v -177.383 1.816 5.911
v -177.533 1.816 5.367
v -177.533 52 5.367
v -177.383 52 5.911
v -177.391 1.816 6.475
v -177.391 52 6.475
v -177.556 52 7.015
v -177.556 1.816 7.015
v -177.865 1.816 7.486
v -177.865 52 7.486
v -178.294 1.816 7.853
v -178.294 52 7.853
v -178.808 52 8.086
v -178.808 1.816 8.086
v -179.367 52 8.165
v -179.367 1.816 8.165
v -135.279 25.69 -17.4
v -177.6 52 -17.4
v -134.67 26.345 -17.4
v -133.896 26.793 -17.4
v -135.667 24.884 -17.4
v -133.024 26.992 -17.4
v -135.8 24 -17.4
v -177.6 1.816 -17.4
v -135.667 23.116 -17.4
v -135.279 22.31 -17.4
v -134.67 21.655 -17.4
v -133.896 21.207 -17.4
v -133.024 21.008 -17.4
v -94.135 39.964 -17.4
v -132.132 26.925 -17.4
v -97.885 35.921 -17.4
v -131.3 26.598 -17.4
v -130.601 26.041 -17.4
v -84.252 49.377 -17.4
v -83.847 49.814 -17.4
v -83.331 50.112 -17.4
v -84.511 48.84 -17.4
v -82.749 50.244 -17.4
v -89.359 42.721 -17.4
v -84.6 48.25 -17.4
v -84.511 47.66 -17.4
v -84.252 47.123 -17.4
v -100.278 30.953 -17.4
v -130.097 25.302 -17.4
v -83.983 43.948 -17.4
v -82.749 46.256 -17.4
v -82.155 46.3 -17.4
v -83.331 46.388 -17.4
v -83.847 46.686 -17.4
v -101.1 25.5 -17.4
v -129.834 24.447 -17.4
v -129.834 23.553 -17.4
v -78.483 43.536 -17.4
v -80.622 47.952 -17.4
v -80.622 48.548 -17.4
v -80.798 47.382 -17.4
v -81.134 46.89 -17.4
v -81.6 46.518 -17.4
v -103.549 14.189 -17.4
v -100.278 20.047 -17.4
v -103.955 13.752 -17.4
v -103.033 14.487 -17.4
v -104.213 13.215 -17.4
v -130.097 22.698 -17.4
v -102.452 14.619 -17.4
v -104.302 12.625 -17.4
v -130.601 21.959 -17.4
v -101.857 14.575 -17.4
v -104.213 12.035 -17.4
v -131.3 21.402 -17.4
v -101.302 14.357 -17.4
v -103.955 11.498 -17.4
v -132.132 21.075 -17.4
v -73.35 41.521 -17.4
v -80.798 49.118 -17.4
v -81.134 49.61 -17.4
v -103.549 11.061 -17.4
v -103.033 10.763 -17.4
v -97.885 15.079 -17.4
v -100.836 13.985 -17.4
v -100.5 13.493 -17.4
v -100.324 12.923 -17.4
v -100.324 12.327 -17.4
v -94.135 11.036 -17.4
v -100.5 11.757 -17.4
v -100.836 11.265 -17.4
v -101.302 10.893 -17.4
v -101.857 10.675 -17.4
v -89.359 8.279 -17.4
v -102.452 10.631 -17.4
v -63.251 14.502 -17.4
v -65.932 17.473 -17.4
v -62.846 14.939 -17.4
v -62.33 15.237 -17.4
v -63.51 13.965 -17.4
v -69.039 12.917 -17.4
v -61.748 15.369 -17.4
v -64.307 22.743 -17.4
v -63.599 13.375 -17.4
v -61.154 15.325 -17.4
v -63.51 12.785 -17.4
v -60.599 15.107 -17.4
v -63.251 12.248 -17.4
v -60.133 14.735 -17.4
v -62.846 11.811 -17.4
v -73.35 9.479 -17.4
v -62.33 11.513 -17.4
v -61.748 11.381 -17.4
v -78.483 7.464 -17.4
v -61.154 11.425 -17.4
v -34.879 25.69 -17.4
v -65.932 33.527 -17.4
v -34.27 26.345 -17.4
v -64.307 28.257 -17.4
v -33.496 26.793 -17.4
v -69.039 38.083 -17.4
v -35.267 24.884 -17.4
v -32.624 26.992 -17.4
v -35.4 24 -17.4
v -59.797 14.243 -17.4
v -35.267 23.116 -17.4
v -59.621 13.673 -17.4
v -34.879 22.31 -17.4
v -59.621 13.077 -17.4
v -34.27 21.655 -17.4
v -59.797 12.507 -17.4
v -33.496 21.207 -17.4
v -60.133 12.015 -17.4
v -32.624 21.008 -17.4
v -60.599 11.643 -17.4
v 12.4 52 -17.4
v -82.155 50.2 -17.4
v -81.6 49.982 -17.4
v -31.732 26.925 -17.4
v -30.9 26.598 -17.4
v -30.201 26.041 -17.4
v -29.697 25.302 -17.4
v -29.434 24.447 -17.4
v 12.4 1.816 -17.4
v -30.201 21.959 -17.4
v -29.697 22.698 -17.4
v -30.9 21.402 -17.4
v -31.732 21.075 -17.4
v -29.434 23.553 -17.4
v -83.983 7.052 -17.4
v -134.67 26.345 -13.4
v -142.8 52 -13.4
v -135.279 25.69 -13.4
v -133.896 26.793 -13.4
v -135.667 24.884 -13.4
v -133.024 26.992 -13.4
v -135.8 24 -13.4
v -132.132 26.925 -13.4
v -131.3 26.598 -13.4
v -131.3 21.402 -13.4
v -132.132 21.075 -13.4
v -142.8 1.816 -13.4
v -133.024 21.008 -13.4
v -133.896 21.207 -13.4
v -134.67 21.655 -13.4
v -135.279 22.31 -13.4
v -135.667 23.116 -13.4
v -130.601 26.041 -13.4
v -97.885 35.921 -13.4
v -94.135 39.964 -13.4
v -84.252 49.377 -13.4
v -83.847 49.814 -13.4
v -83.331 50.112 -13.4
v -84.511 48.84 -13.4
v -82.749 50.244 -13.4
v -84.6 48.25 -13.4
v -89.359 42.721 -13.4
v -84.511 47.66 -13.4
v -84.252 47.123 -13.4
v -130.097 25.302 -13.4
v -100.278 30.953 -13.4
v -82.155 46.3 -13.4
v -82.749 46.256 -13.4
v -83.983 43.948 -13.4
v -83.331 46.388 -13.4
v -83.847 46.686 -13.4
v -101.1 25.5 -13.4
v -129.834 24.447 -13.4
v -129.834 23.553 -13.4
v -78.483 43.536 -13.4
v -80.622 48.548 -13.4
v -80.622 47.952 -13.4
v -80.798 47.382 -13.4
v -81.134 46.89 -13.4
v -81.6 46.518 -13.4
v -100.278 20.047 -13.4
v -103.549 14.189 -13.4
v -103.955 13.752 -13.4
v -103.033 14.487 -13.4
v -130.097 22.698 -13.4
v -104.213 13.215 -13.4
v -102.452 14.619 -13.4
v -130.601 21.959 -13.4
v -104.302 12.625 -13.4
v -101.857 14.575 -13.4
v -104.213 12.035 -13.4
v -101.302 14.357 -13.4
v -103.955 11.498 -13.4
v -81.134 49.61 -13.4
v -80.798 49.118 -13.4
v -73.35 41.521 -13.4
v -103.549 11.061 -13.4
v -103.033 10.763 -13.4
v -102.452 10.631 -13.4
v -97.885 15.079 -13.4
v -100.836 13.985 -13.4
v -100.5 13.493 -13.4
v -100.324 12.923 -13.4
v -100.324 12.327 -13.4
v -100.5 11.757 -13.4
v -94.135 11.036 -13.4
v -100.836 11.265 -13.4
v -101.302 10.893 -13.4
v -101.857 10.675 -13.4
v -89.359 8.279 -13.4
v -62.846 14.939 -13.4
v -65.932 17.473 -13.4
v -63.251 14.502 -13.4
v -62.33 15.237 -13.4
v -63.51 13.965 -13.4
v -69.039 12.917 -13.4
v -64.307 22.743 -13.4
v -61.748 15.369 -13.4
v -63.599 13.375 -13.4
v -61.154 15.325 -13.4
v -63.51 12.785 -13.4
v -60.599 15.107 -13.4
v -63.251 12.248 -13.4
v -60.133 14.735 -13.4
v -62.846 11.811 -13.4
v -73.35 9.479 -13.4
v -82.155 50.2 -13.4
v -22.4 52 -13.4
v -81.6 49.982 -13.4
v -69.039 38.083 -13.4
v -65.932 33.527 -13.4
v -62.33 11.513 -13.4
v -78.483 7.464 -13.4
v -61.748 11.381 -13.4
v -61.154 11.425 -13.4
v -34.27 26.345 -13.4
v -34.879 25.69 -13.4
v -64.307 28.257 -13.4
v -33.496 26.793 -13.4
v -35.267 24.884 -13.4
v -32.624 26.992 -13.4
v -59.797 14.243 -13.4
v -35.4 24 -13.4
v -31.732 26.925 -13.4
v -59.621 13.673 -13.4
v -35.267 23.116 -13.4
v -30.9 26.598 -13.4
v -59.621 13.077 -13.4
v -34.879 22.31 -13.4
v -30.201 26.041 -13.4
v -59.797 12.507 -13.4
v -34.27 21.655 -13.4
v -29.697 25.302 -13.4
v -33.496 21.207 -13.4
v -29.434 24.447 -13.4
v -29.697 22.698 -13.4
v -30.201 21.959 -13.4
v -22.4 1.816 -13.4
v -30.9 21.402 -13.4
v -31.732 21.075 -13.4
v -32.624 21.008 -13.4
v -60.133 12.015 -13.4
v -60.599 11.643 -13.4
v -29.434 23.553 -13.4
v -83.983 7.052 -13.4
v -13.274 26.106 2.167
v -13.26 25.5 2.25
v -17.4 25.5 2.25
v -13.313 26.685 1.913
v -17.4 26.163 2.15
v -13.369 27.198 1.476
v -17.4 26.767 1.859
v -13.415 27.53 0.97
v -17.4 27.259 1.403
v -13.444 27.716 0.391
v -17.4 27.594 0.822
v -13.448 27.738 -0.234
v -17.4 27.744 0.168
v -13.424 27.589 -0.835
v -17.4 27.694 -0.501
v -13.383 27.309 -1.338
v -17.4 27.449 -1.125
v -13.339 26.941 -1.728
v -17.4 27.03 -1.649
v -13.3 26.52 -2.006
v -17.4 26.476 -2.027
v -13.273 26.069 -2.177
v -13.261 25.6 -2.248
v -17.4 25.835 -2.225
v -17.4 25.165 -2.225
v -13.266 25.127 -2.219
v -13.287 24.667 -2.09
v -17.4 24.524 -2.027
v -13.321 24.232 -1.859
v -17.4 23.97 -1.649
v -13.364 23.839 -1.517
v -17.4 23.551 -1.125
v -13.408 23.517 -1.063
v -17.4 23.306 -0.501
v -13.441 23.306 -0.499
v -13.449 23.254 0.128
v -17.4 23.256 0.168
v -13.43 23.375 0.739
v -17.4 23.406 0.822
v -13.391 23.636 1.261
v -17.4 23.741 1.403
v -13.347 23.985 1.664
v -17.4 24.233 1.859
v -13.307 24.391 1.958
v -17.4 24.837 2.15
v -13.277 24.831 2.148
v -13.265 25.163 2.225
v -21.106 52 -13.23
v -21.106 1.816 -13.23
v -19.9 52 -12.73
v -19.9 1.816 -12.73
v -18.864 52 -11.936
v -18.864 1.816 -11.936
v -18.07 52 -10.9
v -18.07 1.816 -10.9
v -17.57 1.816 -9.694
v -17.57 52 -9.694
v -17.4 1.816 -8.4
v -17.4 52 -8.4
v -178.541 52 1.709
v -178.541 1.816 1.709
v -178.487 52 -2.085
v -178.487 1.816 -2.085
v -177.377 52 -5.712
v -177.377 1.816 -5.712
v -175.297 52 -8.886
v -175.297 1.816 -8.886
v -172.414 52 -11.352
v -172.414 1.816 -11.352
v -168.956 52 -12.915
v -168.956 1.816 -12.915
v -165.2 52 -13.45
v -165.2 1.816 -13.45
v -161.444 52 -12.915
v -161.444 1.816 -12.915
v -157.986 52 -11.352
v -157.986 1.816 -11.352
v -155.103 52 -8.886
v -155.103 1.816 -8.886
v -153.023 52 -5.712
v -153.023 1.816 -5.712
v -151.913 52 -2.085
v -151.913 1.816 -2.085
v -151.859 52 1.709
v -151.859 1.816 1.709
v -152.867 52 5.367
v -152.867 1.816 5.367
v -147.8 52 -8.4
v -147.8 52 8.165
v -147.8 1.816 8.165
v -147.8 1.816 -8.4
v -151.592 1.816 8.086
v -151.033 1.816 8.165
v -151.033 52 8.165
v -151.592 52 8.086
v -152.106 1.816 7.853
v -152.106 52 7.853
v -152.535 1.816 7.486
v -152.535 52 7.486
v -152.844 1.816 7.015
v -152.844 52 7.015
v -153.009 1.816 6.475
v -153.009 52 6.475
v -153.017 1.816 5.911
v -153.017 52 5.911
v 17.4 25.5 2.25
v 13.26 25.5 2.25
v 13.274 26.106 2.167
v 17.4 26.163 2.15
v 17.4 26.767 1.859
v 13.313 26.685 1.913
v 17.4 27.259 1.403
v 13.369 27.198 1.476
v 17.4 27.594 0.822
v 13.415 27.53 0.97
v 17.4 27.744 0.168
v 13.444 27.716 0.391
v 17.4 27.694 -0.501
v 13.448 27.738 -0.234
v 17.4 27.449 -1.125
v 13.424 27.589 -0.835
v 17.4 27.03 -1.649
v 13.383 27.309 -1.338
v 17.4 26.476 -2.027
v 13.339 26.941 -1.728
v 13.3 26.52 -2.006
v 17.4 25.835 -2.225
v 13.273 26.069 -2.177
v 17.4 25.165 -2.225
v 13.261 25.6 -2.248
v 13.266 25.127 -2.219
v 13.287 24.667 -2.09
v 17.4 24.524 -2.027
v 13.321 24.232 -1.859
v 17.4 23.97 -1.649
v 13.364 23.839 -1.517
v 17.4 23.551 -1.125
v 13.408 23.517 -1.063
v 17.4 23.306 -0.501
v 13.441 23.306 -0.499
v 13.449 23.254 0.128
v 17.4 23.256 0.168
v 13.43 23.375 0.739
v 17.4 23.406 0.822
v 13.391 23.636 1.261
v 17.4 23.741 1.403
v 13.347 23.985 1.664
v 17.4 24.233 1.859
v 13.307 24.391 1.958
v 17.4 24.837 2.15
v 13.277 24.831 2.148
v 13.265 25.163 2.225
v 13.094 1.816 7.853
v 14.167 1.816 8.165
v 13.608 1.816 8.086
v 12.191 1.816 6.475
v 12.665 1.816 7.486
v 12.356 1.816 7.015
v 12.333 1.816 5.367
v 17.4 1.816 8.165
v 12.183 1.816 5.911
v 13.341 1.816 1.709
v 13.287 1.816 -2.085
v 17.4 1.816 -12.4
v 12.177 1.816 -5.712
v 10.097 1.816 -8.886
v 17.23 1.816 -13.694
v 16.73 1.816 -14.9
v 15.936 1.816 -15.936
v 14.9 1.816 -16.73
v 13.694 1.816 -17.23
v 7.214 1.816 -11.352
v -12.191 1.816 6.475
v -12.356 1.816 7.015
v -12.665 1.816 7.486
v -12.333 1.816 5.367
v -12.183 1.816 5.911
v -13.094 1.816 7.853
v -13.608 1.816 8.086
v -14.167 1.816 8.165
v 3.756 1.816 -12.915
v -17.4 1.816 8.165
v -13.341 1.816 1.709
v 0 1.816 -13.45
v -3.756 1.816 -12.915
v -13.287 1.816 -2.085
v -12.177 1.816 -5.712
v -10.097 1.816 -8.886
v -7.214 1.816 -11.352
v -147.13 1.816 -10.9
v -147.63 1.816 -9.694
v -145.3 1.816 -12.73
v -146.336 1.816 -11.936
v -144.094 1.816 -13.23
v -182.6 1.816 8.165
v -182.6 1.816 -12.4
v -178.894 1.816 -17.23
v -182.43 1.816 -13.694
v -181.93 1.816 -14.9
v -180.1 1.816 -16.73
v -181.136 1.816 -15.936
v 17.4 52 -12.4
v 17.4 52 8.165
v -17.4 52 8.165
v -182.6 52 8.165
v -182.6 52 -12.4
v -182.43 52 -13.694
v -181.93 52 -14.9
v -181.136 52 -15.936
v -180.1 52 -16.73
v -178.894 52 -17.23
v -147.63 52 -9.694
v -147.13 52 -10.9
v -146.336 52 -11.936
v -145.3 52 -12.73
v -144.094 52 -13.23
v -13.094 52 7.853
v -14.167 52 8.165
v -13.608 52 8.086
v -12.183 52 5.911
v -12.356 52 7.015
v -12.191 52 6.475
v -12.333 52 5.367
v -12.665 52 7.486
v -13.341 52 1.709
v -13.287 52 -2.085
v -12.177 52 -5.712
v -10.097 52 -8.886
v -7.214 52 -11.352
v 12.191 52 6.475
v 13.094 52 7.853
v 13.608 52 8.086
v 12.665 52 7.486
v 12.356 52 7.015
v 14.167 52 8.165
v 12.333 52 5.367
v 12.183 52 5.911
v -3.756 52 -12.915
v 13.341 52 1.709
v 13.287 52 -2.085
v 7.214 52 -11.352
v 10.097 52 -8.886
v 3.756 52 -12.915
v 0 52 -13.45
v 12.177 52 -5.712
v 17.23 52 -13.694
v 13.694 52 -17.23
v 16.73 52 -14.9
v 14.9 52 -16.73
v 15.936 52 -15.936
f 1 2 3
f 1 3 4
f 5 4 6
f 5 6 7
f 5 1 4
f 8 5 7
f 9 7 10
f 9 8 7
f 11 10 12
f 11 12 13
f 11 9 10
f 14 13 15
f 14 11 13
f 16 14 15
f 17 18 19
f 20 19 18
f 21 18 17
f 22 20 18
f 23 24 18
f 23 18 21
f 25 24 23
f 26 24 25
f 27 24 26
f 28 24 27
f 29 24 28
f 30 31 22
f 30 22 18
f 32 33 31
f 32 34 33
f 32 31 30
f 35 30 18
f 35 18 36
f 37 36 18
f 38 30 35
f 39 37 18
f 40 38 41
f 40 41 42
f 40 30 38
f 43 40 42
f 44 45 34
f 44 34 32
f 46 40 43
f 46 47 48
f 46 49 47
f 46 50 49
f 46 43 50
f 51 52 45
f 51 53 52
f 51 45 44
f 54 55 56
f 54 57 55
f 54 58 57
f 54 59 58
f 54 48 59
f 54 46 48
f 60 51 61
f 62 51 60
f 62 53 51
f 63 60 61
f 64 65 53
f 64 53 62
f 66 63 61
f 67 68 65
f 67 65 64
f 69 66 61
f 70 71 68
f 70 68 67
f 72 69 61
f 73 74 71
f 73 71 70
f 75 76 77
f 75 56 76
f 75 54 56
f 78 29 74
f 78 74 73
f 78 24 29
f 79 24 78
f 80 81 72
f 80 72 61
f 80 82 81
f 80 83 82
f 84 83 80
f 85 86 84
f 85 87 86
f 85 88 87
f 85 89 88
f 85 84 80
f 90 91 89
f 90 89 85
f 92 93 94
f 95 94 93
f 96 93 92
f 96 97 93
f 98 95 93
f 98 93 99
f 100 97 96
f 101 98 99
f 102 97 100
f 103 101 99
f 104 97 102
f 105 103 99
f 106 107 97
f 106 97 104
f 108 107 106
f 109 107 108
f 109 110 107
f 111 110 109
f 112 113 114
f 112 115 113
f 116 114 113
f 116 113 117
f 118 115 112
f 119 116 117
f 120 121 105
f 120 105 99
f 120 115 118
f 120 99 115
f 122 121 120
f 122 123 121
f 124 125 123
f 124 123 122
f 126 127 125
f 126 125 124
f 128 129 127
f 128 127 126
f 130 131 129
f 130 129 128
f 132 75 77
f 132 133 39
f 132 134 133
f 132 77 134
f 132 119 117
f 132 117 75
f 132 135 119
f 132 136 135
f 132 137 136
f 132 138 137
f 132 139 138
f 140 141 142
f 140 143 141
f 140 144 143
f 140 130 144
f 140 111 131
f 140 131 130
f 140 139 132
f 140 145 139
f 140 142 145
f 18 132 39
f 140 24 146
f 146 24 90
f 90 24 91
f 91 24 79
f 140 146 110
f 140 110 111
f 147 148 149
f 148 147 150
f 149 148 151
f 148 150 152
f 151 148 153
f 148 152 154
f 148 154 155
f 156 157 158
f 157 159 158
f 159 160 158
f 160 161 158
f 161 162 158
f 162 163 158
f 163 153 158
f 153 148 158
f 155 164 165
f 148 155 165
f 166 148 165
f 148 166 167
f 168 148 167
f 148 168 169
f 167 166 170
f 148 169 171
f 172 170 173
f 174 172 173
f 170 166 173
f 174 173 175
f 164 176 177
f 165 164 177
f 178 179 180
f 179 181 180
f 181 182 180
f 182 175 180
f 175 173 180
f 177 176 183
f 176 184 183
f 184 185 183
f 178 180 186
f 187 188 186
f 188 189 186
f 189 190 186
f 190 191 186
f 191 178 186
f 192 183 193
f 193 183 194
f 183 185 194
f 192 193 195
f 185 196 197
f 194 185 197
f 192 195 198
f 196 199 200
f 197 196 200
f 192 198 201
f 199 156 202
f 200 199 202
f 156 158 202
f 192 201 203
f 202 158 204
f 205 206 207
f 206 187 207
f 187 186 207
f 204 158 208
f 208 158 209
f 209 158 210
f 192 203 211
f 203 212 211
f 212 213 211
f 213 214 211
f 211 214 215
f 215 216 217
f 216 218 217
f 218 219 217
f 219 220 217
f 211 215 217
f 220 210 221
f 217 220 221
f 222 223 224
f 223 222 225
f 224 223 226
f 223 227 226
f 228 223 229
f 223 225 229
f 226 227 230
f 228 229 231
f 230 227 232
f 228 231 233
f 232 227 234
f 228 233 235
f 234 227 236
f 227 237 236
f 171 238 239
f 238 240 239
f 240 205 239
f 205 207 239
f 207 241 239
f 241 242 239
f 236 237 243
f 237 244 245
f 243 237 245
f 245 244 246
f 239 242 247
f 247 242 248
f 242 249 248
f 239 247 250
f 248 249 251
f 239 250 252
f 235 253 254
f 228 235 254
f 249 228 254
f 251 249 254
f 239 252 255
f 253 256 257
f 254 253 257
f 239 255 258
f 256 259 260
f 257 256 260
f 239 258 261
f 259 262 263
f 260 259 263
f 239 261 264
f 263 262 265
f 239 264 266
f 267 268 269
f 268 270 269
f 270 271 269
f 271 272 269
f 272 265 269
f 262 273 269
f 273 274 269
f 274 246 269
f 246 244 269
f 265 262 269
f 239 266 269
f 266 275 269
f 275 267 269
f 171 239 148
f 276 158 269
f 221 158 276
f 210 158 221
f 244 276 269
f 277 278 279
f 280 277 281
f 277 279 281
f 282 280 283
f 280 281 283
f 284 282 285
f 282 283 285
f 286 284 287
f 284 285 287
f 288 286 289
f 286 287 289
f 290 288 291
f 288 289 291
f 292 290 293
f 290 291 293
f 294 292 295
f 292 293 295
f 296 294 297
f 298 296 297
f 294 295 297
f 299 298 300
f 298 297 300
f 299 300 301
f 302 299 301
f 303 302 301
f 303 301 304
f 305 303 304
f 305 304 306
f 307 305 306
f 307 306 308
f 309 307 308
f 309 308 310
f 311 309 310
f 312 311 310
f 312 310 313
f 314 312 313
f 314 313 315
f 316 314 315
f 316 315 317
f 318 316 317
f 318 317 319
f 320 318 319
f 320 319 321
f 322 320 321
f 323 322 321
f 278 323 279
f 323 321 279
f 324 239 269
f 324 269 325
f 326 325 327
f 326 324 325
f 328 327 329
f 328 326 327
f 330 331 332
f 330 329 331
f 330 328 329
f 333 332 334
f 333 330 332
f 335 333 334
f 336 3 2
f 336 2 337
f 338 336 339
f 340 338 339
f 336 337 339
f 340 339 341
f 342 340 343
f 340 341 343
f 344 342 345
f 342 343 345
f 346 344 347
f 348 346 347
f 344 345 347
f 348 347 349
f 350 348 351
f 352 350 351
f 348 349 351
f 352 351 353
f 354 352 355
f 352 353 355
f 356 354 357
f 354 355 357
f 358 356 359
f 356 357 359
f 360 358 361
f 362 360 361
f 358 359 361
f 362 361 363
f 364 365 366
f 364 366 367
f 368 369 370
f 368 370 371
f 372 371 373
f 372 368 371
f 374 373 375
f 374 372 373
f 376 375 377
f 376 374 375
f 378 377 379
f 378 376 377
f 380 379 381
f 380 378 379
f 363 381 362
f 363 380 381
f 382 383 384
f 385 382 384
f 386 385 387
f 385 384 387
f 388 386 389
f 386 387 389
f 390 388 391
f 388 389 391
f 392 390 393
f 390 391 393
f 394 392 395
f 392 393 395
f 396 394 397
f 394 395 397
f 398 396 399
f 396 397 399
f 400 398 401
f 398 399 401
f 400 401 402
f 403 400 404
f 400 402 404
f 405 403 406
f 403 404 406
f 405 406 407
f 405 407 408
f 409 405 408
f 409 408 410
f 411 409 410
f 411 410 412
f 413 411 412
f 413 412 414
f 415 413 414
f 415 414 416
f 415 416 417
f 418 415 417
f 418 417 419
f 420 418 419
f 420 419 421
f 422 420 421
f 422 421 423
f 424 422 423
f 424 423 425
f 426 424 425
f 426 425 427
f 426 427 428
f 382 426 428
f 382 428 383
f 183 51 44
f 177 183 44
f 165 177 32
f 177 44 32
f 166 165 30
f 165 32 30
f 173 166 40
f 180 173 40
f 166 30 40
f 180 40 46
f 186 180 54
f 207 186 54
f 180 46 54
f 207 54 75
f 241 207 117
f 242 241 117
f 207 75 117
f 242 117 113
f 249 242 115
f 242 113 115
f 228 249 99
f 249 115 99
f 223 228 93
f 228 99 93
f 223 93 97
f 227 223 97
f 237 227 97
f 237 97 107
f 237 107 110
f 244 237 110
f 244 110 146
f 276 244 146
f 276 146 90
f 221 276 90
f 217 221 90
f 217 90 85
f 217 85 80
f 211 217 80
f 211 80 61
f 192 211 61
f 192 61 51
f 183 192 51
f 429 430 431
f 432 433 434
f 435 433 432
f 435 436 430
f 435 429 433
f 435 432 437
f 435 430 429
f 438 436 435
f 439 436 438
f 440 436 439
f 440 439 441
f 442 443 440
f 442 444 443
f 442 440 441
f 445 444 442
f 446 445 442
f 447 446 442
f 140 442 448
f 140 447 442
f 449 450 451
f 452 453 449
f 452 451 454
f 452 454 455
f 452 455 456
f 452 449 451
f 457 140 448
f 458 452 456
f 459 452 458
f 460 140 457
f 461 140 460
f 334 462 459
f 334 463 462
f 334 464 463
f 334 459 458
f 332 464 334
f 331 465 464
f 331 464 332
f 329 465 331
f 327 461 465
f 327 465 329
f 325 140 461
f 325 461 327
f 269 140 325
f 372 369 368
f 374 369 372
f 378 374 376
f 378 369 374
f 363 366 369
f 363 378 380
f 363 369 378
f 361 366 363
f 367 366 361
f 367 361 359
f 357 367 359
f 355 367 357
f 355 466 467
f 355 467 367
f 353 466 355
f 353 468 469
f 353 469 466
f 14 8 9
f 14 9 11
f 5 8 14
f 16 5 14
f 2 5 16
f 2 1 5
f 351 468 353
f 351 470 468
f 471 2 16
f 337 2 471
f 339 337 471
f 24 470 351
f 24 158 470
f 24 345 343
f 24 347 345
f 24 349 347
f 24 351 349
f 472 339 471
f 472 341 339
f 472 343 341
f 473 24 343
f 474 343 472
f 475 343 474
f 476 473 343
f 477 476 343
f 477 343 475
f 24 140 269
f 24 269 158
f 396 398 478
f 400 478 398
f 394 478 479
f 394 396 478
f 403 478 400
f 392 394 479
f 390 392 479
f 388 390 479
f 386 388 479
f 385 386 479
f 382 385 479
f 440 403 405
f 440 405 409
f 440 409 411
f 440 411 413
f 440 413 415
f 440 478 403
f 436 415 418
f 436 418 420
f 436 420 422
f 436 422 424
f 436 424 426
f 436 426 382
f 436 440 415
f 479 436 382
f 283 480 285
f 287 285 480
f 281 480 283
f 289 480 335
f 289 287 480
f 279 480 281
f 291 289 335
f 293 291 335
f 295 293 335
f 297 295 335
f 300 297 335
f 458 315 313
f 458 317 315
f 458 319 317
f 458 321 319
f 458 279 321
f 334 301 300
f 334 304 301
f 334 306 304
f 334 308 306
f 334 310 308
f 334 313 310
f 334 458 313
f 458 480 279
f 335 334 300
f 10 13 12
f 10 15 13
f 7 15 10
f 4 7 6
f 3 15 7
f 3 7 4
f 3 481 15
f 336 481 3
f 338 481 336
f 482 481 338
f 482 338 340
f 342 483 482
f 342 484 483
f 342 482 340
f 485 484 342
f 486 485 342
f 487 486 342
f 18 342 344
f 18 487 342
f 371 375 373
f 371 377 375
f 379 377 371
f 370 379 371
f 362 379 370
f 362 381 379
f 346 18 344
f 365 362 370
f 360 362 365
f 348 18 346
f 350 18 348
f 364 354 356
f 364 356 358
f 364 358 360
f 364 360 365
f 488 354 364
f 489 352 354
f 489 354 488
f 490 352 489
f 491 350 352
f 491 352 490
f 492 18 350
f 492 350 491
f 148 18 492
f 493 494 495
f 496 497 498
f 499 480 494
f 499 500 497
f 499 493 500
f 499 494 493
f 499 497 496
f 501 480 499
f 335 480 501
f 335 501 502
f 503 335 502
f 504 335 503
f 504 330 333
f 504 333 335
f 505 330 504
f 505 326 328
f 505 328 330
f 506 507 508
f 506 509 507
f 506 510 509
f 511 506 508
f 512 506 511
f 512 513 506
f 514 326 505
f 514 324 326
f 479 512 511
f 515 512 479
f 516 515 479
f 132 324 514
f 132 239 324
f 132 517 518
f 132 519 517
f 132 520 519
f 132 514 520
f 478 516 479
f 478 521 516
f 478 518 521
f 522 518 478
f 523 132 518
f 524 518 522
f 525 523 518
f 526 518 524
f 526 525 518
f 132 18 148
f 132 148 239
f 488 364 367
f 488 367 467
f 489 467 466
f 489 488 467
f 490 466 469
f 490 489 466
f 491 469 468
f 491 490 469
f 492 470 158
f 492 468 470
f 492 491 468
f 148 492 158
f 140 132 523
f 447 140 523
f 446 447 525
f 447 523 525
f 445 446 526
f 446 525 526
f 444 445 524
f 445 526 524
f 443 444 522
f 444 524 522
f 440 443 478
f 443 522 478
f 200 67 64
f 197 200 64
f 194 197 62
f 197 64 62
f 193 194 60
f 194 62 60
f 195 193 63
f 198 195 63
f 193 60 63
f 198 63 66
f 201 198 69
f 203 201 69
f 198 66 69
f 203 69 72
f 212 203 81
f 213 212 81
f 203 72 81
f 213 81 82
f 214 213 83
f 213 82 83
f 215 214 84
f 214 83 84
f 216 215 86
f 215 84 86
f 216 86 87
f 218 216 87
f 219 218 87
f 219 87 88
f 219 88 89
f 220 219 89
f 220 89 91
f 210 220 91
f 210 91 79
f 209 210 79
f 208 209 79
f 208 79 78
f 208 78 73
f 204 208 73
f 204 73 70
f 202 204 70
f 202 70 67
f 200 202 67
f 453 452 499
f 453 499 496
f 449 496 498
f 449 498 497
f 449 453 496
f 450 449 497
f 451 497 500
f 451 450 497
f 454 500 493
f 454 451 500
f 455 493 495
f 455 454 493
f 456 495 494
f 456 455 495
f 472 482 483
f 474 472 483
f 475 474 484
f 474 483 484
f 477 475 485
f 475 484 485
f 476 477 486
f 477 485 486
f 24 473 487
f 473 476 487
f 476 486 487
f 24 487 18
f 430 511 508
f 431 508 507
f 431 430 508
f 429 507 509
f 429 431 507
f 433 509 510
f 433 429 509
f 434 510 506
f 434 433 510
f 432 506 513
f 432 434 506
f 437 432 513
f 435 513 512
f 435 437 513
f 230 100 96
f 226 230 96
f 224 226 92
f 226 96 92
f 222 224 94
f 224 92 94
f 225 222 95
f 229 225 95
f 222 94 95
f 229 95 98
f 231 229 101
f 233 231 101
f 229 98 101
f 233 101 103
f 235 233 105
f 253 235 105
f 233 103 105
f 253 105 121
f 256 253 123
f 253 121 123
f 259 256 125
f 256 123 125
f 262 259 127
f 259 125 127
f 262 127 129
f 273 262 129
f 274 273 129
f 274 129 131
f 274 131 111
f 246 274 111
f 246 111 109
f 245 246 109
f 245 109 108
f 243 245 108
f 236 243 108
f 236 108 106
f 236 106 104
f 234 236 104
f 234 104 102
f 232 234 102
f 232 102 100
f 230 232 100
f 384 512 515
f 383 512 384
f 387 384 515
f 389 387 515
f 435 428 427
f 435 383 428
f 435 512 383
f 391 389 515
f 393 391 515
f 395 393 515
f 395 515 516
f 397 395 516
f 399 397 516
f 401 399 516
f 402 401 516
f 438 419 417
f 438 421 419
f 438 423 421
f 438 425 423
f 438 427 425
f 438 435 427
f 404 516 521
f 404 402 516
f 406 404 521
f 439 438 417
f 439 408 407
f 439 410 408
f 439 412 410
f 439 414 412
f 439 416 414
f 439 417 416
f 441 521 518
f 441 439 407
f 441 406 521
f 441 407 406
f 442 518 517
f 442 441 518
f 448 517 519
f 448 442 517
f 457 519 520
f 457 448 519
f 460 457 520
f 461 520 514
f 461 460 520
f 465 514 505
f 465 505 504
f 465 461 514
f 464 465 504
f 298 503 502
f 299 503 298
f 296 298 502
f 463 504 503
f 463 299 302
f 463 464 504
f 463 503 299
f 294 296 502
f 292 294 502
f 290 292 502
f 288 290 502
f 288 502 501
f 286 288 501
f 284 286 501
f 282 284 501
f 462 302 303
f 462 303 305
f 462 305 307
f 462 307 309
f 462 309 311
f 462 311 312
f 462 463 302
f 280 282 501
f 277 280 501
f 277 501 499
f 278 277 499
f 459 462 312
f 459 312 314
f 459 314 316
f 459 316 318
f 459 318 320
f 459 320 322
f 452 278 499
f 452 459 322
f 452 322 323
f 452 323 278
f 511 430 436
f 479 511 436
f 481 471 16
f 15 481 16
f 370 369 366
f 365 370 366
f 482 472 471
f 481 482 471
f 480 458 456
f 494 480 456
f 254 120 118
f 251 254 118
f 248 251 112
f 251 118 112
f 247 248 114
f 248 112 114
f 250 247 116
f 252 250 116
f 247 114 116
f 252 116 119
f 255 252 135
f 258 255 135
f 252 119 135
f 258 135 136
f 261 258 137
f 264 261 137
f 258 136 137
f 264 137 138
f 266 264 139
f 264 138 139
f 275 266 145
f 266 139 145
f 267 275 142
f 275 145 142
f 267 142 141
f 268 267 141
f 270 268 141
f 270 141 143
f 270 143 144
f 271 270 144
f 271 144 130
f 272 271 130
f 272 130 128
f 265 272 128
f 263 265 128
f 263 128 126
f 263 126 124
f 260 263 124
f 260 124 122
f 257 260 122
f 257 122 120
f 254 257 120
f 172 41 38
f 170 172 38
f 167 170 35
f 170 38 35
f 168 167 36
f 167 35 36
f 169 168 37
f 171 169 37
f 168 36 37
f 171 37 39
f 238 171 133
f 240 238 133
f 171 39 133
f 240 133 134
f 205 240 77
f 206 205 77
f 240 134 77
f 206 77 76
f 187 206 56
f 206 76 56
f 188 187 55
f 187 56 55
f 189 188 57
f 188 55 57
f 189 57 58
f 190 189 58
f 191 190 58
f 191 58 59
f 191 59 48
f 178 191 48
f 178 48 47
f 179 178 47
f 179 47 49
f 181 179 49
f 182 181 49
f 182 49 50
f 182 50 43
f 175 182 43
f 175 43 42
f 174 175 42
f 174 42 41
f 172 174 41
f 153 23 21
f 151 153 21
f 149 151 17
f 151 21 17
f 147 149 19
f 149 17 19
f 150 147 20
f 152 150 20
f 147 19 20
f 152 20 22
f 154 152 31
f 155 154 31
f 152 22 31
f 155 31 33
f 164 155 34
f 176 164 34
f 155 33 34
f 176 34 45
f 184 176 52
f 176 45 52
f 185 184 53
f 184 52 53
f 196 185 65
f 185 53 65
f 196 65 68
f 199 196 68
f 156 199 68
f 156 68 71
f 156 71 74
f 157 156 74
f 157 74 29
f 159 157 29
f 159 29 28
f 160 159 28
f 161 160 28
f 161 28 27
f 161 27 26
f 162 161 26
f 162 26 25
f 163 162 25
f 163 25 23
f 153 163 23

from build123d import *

# Parameters (mm, degrees)
BOSS_EXTRUDE2_START = -1
SKETCH1_R           = 13.45
BOSS_EXTRUDE2_DEPTH = 53
FILLET1_R           = 3
FILLET2_R           = 5
SKETCH9_R           = 2.25
CUT_EXTRUDE2_DEPTH  = 175.062632406
CUT_EXTRUDE4_DEPTH  = 61
FILLET3_R           = 2
SKETCH12_R          = 18.5
SKETCH12_R_2        = 2
CUT_EXTRUDE5_DEPTH  = 61
SKETCH13_R          = 3
CUT_EXTRUDE8_DEPTH  = 41
SKETCH14_W          = 211.811280225
SKETCH14_H          = 13.838629025
CUT_EXTRUDE10_DEPTH = 41


with BuildPart() as part:
    # Sketch1 → Boss-Extrude2 (new body)
    with BuildSketch(Plane(origin=(0, 0, 0), x_dir=(1, 0, 0), z_dir=(0, 1, 0)).offset(BOSS_EXTRUDE2_START)):
        Polygon((-17.4, 17.4), (17.4, 17.4), (17.4, -17.4), (-17.4, -17.4), (-17.4, 13.4), (-82.6, 13.4), (-82.6, 17.4), align=None)
        with Locations(Location((0, 0, 0), (0, 0, 270))):
            Circle(SKETCH1_R, mode=Mode.SUBTRACT)
    boss_extrude2 = extrude(amount=BOSS_EXTRUDE2_DEPTH)

    # Mirror2: Boss-Extrude2 across plane
    add(boss_extrude2.mirror(Plane(origin=(-82.6, -1, -17.4), x_dir=(0, 0, 1), z_dir=(-1, 0, 0))))

    # Fillet1
    fillet1_edges = [part.edges().sort_by_distance(p)[0] for p in [
        (17.4, 25.5, 17.4),
        (-17.4, 25.5, 17.4),
        (-182.6, 25.5, 17.4),
        (-147.8, 25.5, 17.4),
    ]]
    fillet(fillet1_edges, radius=FILLET1_R)

    # Fillet2
    fillet2_edges = [part.edges().sort_by_distance(p)[0] for p in [
        (-17.4, 25.5, -13.4),
        (17.4, 25.5, -17.4),
        (-182.6, 25.5, -17.4),
        (-147.8, 25.5, -13.4),
    ]]
    fillet(fillet2_edges, radius=FILLET2_R)

    # Sketch9 → Cut-Extrude2 (cut, through all)
    with BuildSketch(Plane.ZY.offset(17.4)):
        with Locations((0, 25.5)):
            Circle(SKETCH9_R)
    extrude(amount=-CUT_EXTRUDE2_DEPTH, mode=Mode.SUBTRACT)

    # Sketch11 → Cut-Extrude4 (cut)
    with BuildSketch(Plane.XZ.offset(1)):
        Polygon((17.4, 11.356288415), (17.4, 18.363602968), (-17.4, 18.363602968), (-17.4, 11.356288415), (-17.4, 8.165104504), (-10.6880105, 8.165104504), (10.6880105, 8.165104504), (17.4, 8.165104504), align=None)
        Polygon((-182.6, 11.356288415), (-182.6, 18.363602968), (-147.8, 18.363602968), (-147.8, 11.356288415), (-147.8, 8.165104504), (-154.5119895, 8.165104504), (-175.8880105, 8.165104504), (-182.6, 8.165104504), align=None)
    extrude(amount=-CUT_EXTRUDE4_DEPTH, mode=Mode.SUBTRACT)

    # Fillet3
    fillet3_edges = [part.edges().sort_by_distance(p)[0] for p in [
        (-154.5119895, 25.5, 8.165104504),
        (-175.8880105, 25.5, 8.165104504),
        (10.6880105, 25.5, 8.165104504),
        (-10.6880105, 25.5, 8.165104504),
    ]]
    fillet(fillet3_edges, radius=FILLET3_R)

    # Sketch12 → Cut-Extrude5 (cut)
    with BuildSketch(Plane(origin=(0, 0, -17.4), x_dir=(-1, 0, 0), z_dir=(0, 0, -1))):
        with Locations((82.6, 25.5)):
            Circle(SKETCH12_R)
        with Locations((82.6, 48.25)):
            Circle(SKETCH12_R_2)
        with Locations((102.302077936, 12.625)):
            Circle(SKETCH12_R_2)
        with Locations((61.598883958, 13.375)):
            Circle(SKETCH12_R_2)
    extrude(amount=-CUT_EXTRUDE5_DEPTH, mode=Mode.SUBTRACT)

    # Sketch13 → Cut-Extrude8 (cut)
    with BuildSketch(Plane(origin=(0, 0, -17.4), x_dir=(-1, 0, 0), z_dir=(0, 0, -1))):
        with Locations((132.8, 24)):
            Circle(SKETCH13_R)
        with Locations((32.4, 24)):
            Circle(SKETCH13_R)
    extrude(amount=-CUT_EXTRUDE8_DEPTH, mode=Mode.SUBTRACT)

    # Sketch14 → Cut-Extrude10 (cut)
    with BuildSketch(Plane(origin=(0, 0, -17.4), x_dir=(-1, 0, 0), z_dir=(0, 0, -1))):
        with Locations((80.800037621, -5.103044057)):
            Rectangle(SKETCH14_W, SKETCH14_H)
    extrude(amount=-CUT_EXTRUDE10_DEPTH, mode=Mode.SUBTRACT)


solid = part.part
